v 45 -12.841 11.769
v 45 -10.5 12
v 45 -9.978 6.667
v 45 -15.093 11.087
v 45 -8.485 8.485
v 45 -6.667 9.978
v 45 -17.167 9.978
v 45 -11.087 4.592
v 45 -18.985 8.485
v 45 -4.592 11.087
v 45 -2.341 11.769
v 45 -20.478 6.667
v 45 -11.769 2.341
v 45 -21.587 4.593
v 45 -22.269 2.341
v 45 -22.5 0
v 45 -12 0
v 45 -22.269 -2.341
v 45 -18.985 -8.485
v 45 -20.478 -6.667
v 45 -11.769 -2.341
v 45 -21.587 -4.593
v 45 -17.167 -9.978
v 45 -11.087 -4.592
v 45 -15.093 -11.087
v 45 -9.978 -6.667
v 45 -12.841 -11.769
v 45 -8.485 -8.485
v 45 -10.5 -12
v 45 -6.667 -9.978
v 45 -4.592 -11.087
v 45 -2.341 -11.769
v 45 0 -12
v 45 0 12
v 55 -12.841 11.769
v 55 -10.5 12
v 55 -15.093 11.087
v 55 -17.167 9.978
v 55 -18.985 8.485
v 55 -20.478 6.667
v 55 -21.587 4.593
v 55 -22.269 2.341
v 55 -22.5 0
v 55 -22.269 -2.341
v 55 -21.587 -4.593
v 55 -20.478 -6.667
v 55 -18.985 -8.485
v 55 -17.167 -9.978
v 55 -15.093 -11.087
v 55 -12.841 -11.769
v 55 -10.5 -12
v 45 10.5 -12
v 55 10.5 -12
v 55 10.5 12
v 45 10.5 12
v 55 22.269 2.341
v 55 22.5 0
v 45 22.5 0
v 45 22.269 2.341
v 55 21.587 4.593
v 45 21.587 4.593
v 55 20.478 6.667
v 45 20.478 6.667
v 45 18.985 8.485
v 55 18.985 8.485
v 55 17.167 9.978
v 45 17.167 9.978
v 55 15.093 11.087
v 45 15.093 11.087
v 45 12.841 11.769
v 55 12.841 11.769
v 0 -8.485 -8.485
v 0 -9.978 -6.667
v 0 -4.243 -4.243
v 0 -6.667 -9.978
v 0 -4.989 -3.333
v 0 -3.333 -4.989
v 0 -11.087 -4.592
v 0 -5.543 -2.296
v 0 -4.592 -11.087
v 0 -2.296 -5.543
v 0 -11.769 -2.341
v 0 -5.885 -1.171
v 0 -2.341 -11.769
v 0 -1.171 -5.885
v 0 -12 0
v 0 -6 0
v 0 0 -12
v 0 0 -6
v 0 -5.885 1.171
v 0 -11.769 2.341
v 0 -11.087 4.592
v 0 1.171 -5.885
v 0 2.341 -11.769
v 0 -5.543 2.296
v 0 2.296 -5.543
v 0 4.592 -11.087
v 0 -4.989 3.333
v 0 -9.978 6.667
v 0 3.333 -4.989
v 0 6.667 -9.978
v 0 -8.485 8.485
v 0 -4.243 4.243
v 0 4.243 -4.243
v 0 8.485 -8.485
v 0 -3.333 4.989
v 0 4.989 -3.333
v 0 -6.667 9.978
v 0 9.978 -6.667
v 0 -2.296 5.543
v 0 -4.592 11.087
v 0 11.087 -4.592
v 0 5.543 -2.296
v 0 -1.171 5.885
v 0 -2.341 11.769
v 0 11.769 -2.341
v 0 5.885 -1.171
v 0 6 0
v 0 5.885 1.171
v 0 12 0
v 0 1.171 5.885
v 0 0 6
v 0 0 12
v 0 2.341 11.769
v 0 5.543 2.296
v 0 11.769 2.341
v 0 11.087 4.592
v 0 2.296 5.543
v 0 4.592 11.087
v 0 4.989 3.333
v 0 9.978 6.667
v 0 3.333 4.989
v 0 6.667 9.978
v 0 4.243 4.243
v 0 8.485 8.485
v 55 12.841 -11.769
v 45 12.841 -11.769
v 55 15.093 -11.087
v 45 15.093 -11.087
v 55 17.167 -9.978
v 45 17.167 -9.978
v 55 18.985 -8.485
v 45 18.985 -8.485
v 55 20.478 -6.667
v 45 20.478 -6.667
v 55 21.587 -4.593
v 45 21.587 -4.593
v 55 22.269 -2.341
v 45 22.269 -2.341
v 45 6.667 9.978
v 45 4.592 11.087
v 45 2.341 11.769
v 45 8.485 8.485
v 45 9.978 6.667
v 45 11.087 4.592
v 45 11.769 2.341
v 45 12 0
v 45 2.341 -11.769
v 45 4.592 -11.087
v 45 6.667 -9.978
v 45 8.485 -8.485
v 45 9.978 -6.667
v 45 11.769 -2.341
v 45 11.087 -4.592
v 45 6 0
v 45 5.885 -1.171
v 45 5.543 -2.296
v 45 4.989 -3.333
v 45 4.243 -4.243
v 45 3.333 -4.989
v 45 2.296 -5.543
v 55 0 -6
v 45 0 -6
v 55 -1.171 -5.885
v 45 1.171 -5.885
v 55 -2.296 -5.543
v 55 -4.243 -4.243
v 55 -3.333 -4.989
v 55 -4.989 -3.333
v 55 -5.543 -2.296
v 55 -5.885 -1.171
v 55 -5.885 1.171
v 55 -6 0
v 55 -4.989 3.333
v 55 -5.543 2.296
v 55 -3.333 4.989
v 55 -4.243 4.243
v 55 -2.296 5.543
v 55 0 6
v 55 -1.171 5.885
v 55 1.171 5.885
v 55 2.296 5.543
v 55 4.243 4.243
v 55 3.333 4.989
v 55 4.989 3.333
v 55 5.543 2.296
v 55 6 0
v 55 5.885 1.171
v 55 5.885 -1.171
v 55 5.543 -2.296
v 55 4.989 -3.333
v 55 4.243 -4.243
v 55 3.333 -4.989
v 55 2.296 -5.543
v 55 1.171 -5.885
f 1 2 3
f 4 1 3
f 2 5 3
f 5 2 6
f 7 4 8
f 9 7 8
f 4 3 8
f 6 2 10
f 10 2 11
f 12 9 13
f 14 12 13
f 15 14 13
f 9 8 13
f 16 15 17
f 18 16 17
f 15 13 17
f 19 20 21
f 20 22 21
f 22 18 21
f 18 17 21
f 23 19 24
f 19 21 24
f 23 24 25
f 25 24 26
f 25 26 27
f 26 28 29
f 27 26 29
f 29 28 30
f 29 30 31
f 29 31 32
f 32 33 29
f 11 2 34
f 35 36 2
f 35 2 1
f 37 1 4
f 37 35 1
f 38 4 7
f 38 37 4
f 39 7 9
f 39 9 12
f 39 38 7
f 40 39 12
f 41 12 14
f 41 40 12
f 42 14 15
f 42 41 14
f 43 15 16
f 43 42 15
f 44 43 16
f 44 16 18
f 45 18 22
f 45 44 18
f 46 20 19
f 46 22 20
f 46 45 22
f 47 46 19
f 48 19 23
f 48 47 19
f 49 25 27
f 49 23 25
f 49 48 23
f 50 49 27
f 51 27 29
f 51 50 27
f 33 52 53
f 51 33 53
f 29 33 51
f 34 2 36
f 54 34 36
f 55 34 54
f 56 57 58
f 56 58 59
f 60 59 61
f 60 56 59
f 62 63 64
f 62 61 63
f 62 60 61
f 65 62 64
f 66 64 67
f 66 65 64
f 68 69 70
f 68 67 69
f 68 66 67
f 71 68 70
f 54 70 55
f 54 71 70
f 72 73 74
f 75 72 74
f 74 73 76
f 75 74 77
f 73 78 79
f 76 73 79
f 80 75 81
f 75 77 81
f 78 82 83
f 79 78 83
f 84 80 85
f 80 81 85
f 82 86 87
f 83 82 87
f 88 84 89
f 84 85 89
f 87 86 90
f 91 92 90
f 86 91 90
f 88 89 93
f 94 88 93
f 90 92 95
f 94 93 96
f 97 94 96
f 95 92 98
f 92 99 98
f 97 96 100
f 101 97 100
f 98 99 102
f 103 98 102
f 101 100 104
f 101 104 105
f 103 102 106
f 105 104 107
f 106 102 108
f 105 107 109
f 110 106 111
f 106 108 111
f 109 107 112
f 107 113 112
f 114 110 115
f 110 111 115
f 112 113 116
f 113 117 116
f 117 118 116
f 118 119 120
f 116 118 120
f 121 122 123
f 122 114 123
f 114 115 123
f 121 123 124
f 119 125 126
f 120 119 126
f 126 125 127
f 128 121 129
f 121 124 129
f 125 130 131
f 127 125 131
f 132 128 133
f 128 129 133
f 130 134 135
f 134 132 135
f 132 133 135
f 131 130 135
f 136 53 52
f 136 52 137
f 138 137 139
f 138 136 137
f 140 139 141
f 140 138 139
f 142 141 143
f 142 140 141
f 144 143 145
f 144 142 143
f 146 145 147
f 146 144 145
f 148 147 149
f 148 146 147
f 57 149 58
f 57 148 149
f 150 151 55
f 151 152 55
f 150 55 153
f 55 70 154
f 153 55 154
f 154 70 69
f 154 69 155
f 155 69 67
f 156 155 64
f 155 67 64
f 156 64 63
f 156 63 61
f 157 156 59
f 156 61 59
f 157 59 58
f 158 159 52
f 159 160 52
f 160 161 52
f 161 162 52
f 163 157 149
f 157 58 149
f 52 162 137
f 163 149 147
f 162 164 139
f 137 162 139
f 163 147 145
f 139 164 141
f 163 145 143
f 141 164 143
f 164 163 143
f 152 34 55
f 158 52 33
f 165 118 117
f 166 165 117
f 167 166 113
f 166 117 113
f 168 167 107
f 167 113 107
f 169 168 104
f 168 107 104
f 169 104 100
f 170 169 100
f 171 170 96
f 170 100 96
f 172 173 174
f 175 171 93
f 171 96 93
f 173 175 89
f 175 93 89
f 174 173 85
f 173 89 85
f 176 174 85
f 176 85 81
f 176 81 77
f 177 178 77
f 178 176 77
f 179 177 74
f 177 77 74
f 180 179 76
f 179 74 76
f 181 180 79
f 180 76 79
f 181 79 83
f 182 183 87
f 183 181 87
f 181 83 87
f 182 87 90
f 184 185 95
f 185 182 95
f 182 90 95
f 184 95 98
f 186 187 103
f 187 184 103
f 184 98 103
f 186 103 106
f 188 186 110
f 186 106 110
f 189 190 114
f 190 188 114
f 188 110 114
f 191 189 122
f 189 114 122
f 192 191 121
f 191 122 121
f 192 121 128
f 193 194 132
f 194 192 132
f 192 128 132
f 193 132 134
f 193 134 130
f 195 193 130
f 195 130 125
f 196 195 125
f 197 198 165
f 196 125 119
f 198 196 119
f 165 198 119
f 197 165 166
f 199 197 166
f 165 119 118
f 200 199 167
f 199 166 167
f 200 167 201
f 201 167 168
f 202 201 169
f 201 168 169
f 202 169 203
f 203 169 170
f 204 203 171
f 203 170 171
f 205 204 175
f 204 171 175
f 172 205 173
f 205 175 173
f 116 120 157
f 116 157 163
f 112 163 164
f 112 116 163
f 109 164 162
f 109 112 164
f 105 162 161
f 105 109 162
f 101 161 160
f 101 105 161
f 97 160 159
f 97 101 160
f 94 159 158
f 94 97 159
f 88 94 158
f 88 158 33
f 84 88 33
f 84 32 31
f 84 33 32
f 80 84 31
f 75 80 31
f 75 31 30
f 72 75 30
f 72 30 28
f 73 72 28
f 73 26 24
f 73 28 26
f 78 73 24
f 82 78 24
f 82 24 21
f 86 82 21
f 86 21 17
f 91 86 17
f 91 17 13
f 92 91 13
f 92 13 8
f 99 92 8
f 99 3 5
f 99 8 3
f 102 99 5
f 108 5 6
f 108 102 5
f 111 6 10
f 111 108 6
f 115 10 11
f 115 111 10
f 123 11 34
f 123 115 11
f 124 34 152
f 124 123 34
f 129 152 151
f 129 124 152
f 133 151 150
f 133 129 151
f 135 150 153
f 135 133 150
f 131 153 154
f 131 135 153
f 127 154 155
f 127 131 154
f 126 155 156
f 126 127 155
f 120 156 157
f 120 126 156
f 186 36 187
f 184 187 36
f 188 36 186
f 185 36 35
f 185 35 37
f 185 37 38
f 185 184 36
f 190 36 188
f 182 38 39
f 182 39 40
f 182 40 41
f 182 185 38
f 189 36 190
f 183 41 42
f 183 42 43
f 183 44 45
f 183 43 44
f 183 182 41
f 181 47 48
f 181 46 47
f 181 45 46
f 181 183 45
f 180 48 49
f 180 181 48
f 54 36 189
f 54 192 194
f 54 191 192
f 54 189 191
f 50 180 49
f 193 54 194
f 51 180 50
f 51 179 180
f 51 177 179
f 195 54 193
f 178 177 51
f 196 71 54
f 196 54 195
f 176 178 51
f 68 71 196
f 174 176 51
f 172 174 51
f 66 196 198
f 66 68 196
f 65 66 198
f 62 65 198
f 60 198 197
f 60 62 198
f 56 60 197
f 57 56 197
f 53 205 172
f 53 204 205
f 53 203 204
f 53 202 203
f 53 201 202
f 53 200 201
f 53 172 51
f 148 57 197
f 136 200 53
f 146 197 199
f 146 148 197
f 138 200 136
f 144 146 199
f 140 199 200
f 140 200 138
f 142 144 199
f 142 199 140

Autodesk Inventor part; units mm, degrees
ref_plane "YZ Plane" through (0, 0, 0) normal (1, 0, 0) x (0, 1, 0)
ref_plane "XZ Plane" through (0, 0, 0) normal (0, 1, 0) x (-1, 0, 0)
ref_plane "XY Plane" through (0, 0, 0) normal (0, 0, 1) x (1, 0, 0)
sketch "Sketch1" plane through (0, 0, 0) normal (1, 0, 0) x (0, 1, 0)
  circle A0 centre (0, 0) radius 6
  circle A1 centre (0, 0) radius 12
  dimension "d0" = 12
  dimension "d1" = 24
extrude "Extrusion1" add sketch "Sketch1" along normal blind 45
sketch "Sketch2" plane through (45, 0, 0) normal (1, 0, 0) x (0, 0, -1)
  circle A0 centre (0, 0) radius 6 projected
  circle A1 centre (0, 0) radius 12 projected
  line L0 (12, -22.5) -> (-12, -22.5)
  line L1 (-12, -22.5) -> (-12, 22.5)
  line L2 (-12, 22.5) -> (12, 22.5)
  line L3 (12, 22.5) -> (12, -22.5)
  line L4 (0, 0) -> (3.4418, 0)
  point P0 (12, 0)
  dimension "d4" = 45
extrude "Extrusion2" add sketch "Sketch2" along normal blind 10
fillet "Fillet1" radius 12 4 edges at (50, -22.5, -12) (50, -22.5, 12) (50, 22.5, -12) (50, 22.5, 12)
thread "Thread1" size "M12x1.75" class "6H" standard "ANSI Metric M Profile" full length
properties part number "Rotator" material "Steel, Alloy"
